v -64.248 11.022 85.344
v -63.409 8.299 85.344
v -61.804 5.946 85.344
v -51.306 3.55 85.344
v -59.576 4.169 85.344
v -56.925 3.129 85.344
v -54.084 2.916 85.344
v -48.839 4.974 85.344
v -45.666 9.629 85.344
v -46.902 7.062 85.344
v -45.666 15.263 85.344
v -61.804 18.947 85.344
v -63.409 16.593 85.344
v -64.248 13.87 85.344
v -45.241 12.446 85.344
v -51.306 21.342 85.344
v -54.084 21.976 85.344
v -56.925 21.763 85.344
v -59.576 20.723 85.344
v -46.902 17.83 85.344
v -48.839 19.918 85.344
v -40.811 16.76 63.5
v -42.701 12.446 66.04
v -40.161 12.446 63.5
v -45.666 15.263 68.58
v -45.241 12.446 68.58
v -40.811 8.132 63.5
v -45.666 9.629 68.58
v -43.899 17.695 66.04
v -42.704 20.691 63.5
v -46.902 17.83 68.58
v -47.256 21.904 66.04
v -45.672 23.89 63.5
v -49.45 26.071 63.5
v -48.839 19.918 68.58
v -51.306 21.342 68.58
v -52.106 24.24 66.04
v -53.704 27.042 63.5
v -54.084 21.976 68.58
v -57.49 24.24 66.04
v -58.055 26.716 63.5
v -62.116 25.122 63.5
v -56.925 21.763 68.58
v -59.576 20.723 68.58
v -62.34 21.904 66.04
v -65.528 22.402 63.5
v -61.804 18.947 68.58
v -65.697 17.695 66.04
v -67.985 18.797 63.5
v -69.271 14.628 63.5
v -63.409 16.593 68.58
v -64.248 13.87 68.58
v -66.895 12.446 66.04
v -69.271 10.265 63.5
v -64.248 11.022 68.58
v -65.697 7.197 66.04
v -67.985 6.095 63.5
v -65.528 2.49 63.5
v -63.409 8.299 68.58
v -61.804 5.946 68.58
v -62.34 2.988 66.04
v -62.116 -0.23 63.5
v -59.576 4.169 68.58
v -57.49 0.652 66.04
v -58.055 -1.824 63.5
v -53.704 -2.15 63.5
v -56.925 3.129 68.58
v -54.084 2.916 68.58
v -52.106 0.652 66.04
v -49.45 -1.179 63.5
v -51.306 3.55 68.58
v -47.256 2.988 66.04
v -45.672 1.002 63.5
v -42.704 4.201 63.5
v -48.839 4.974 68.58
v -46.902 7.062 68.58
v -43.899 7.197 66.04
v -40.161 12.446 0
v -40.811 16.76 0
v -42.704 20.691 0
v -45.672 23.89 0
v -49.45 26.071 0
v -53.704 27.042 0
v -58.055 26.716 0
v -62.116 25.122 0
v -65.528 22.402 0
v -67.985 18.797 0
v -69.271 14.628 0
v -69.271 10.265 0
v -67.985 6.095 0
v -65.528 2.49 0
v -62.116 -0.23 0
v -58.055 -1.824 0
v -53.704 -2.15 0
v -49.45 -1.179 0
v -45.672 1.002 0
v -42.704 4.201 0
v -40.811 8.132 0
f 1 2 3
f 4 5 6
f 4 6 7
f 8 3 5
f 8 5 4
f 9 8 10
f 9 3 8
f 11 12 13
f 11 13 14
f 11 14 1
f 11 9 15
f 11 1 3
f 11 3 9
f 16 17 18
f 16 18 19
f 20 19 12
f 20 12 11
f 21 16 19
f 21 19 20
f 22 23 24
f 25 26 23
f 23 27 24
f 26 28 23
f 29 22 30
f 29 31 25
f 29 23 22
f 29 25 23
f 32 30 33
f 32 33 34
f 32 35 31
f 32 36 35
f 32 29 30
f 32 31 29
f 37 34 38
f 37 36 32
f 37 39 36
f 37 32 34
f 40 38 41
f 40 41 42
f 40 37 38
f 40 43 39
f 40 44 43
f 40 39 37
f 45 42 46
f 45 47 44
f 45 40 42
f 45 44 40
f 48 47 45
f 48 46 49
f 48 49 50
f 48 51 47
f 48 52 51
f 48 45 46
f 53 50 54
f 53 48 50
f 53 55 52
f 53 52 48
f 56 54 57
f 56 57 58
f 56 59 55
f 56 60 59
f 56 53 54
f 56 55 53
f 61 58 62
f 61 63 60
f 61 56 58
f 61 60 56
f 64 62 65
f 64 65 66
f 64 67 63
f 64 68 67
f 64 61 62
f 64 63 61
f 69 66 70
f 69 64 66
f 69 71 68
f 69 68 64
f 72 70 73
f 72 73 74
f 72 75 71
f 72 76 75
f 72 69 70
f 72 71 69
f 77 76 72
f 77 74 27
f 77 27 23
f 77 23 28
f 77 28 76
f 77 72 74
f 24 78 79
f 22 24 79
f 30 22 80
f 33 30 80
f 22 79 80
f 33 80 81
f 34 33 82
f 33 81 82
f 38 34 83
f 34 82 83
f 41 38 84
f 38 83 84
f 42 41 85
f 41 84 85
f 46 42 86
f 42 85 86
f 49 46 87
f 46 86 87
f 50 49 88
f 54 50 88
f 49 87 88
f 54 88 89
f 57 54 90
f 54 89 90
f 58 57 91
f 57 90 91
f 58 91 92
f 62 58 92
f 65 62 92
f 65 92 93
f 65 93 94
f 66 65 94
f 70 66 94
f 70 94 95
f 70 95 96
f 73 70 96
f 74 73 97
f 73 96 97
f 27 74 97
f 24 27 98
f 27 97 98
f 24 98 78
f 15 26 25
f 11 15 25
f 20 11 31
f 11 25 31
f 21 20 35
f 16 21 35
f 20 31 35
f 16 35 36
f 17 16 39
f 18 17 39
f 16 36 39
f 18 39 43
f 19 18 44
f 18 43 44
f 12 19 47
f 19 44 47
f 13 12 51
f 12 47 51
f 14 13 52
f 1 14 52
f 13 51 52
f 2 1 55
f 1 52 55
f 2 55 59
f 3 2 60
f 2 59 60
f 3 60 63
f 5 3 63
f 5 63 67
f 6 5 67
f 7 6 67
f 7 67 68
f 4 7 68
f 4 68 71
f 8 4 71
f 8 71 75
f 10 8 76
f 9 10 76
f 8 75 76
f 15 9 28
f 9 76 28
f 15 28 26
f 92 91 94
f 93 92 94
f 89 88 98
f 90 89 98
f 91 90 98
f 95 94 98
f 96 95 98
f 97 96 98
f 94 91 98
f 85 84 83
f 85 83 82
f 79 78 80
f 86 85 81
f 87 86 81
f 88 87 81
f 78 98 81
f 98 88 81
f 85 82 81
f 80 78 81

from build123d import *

# Parameters (mm, degrees)
F0_R      = 14.637001
F1_DEPTH  = 68.58
F2_SIZE   = 5.08
F1_FACE_R = 9.557001
F3_DEPTH  = 16.764


with BuildPart() as f1:
    # F0 (on Top) → F1 (new body)
    with BuildSketch(Plane.XY):
        with Locations((-54.797947, 12.446093)):
            Circle(F0_R)
    extrude(amount=F1_DEPTH)

    # F2
    f2_edges = [f1.edges().sort_by_distance(p)[0] for p in [
        (-69.434948, 12.446093, 68.58),
    ]]
    chamfer(f2_edges, length=F2_SIZE)

    # F1_face (on face) → F3 (join)
    with BuildSketch(Plane(origin=(-54.797947, 12.446093, 68.58), x_dir=(1, 0, 0), z_dir=(0, 0, 1))):
        Circle(F1_FACE_R)
    extrude(amount=F3_DEPTH)


solid = f1.part
